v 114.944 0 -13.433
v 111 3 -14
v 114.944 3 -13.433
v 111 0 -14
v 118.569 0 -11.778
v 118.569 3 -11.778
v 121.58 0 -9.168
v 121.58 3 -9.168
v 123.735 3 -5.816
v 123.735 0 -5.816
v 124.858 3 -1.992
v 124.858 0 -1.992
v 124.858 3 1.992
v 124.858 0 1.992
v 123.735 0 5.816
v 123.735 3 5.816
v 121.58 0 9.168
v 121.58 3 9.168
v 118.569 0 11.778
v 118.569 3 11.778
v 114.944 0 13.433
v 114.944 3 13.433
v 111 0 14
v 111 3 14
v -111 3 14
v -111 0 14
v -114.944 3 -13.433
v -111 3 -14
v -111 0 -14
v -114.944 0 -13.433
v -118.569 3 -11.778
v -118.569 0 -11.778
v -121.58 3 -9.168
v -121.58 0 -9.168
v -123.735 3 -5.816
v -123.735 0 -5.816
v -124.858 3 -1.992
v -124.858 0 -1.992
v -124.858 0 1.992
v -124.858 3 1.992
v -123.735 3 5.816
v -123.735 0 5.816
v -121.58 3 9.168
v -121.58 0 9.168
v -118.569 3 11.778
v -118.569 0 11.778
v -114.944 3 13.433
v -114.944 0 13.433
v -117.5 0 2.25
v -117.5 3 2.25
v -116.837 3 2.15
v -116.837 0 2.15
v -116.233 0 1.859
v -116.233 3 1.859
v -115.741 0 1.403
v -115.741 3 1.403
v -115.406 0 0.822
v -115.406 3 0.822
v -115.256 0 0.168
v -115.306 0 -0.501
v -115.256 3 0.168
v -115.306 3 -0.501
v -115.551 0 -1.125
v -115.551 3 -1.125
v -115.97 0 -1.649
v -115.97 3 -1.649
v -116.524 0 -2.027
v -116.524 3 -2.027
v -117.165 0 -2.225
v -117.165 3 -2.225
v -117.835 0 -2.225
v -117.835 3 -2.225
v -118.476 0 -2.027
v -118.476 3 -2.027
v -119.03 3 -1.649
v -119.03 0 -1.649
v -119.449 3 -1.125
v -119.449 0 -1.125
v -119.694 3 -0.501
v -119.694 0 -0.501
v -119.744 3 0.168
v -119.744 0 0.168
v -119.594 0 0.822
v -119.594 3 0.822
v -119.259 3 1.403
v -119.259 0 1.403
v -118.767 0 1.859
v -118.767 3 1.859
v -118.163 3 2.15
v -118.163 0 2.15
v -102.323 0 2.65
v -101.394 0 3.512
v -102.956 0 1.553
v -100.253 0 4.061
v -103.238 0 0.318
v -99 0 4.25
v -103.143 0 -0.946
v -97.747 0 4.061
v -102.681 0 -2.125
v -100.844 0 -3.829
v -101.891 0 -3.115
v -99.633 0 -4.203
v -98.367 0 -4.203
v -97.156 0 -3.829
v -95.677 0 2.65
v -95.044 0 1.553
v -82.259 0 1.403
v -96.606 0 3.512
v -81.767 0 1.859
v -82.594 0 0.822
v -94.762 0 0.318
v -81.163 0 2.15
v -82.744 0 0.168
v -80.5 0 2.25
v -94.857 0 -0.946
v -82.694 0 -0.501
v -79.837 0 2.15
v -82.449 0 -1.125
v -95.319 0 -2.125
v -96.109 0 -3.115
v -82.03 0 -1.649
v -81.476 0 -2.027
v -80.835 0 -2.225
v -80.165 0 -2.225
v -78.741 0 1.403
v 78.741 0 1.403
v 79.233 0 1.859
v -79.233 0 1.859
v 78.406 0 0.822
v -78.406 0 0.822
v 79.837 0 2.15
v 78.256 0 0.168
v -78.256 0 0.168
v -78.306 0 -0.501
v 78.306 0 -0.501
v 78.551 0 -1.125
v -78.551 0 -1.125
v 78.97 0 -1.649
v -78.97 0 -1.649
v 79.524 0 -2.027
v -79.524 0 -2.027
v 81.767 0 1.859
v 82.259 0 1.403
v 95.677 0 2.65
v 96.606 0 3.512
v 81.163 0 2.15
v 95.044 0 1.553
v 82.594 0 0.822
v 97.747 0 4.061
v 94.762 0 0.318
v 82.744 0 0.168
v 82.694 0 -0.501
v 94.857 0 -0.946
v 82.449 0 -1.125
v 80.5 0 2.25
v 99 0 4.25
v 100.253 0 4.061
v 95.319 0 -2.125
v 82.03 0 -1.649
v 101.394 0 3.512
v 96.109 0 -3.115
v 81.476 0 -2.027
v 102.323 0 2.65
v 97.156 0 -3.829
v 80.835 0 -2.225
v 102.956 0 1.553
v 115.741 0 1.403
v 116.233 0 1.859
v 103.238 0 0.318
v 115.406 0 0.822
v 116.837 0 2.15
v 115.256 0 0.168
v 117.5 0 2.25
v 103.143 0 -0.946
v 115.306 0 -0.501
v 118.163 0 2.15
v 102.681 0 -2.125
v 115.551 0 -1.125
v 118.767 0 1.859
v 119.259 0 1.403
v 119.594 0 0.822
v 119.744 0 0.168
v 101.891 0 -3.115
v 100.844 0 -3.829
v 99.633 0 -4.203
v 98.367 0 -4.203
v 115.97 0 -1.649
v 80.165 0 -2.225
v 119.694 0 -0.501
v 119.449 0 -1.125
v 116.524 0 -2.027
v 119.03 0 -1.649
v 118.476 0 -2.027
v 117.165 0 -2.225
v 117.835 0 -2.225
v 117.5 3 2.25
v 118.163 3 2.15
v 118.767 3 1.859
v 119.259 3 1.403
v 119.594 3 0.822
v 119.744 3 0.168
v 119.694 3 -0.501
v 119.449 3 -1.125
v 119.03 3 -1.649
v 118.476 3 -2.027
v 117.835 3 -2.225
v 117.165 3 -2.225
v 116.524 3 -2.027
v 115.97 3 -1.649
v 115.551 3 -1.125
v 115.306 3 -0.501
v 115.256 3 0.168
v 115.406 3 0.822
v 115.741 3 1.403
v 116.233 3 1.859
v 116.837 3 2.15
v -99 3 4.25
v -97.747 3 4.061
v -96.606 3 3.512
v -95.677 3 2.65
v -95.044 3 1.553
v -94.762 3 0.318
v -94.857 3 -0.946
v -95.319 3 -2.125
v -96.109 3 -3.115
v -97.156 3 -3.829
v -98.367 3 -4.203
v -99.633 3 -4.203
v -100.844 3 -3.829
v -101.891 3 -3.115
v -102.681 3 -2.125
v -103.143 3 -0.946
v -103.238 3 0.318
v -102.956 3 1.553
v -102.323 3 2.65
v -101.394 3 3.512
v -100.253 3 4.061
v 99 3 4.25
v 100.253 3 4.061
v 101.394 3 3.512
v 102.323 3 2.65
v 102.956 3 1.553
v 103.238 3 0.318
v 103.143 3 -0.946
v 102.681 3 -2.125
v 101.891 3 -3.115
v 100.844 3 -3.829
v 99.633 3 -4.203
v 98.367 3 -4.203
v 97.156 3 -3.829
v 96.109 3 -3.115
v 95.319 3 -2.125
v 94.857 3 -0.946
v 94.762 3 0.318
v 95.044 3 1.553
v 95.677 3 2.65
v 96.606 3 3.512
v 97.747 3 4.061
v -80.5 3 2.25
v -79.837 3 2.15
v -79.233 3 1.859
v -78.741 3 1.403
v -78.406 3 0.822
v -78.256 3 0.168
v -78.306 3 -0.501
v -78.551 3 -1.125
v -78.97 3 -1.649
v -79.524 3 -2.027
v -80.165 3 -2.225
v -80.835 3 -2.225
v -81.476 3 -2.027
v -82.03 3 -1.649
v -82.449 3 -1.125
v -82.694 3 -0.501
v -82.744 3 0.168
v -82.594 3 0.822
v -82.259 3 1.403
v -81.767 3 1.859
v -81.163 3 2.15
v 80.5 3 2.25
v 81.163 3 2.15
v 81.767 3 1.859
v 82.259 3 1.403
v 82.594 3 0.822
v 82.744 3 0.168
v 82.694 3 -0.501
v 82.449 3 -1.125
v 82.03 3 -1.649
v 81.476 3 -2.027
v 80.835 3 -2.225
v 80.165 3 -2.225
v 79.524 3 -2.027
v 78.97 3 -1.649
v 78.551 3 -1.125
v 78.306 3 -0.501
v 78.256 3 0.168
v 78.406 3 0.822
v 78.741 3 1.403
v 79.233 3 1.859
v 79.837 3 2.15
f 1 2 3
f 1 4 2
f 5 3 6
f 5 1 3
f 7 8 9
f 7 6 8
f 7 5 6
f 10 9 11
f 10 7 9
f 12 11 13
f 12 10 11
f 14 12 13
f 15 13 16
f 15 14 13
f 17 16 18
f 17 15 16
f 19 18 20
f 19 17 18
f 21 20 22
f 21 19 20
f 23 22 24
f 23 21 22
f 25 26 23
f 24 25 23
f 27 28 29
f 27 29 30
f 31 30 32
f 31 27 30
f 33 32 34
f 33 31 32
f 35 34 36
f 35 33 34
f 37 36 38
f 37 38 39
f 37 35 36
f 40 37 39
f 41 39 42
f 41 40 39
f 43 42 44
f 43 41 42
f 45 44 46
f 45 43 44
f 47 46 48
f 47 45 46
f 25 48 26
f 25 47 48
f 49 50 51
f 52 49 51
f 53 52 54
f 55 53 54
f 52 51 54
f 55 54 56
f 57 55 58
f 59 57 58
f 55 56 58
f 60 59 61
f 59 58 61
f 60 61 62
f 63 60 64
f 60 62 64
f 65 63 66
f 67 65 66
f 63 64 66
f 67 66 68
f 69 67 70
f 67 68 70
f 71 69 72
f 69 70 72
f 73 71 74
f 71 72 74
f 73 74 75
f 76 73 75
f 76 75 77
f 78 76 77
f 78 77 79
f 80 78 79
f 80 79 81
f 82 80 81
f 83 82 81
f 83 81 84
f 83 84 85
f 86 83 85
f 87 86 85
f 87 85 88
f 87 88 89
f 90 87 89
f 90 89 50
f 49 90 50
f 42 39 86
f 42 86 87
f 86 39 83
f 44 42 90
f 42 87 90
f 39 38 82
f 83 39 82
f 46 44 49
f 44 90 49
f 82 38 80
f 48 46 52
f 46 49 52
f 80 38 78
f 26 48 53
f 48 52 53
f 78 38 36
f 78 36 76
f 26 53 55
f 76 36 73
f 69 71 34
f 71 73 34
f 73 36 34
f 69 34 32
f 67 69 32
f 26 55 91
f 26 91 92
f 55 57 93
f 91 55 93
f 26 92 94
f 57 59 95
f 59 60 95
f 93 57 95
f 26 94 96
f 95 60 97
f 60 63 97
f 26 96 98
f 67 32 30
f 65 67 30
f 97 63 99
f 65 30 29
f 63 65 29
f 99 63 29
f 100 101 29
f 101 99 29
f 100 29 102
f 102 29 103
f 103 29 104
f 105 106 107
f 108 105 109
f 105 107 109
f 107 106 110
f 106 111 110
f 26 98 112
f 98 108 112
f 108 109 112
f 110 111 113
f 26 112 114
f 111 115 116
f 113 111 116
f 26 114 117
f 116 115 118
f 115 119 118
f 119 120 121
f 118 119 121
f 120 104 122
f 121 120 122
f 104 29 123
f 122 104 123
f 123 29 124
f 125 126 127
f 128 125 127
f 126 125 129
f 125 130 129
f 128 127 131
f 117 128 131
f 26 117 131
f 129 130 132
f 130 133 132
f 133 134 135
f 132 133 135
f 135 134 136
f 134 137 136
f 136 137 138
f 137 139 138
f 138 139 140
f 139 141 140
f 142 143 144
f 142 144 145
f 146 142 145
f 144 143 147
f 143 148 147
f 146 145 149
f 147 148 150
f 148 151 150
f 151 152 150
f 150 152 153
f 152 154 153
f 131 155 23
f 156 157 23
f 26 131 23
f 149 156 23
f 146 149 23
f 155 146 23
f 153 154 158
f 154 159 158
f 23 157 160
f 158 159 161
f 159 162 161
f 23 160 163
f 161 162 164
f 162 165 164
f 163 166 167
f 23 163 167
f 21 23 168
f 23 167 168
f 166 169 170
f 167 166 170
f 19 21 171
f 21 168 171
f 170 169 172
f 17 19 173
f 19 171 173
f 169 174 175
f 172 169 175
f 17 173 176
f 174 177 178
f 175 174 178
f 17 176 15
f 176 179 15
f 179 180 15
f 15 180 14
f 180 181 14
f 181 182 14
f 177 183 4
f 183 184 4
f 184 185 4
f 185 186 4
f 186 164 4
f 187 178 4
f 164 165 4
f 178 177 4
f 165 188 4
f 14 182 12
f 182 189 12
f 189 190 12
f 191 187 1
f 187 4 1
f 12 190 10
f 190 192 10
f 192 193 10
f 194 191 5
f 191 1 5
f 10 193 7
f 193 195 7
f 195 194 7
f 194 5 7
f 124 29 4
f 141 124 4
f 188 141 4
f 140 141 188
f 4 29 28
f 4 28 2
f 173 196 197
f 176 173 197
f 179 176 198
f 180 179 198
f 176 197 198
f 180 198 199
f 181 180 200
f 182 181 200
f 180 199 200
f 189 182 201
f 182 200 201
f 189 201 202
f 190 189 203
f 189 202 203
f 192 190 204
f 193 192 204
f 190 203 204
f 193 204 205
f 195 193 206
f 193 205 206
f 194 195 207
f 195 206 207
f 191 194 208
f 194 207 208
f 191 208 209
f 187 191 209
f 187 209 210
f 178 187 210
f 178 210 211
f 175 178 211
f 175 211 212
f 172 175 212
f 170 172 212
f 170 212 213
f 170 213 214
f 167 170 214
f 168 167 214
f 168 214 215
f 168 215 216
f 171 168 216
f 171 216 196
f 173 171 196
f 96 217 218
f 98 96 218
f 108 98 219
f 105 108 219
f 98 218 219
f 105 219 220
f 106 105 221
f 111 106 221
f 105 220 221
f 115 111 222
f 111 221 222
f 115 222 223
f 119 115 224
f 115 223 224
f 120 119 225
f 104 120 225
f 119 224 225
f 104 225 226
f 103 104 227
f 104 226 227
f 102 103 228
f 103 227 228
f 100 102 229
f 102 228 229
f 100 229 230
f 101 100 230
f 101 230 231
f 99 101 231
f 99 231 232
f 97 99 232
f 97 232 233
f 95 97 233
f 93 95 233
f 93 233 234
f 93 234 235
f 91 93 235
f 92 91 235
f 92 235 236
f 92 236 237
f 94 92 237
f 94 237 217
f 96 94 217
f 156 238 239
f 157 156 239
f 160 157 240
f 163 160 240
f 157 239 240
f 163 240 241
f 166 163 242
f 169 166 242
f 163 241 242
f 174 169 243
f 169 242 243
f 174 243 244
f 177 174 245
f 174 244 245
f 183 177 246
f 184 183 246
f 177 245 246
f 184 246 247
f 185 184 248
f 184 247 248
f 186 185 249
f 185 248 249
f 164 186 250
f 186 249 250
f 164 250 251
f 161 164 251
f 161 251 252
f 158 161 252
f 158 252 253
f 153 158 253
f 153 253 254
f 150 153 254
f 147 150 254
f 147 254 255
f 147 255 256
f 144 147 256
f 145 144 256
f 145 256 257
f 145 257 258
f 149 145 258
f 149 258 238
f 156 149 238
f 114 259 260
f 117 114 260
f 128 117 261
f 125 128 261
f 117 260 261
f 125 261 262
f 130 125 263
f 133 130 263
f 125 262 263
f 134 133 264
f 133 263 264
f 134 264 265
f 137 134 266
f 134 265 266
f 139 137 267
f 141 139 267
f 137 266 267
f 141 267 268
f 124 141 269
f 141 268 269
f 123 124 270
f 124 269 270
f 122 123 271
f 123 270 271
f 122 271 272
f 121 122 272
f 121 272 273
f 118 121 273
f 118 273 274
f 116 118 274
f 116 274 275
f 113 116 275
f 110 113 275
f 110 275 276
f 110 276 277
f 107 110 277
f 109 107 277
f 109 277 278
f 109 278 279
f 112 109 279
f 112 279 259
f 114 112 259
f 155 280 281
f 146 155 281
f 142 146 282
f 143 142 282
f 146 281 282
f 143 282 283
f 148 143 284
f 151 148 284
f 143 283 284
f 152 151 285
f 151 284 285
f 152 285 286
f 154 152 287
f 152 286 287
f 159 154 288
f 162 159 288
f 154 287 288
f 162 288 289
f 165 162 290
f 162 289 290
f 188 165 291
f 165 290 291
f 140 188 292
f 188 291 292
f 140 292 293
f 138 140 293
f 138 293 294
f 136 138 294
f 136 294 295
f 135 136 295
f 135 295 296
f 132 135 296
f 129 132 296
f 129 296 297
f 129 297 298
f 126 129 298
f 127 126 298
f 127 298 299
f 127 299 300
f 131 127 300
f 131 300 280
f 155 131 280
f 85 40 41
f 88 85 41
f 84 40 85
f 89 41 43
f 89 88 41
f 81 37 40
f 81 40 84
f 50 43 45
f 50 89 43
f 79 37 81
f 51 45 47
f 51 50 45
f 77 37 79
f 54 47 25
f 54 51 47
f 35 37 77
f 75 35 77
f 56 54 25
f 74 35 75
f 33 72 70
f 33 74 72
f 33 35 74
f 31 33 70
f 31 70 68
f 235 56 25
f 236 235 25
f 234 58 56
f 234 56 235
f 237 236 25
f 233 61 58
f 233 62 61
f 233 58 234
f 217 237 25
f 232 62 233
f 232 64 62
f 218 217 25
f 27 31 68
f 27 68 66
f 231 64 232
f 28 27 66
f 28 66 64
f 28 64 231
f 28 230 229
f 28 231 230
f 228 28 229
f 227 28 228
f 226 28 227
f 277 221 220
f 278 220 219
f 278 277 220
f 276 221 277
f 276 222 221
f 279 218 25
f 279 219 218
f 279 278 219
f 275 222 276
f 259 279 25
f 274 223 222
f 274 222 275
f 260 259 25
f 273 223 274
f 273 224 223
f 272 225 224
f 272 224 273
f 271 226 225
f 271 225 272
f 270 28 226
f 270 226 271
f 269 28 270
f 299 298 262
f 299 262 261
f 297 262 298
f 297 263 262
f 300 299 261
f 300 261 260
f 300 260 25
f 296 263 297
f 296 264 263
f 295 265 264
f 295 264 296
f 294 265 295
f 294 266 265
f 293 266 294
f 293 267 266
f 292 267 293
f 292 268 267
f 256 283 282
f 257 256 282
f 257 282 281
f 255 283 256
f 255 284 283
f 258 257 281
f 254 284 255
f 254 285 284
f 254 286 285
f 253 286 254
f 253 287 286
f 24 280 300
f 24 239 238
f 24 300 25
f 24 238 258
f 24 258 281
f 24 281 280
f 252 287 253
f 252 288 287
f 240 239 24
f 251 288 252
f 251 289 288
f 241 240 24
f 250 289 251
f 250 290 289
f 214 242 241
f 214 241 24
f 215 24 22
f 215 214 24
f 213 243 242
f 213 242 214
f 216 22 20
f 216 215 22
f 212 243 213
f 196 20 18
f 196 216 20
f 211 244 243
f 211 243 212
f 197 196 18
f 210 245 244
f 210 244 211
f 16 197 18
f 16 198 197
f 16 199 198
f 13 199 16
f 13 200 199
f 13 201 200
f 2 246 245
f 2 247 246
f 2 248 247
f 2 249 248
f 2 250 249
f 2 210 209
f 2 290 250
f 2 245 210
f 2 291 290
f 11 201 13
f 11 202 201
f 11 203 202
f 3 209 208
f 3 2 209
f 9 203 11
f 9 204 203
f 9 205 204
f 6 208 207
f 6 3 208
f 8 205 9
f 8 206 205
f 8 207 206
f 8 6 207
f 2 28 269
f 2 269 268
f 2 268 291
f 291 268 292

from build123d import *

# Parameters (mm, degrees)
SKETCH_1_W          = 250
SKETCH_1_H          = 28
EXTRUDE_1_DEPTH     = 3
CUT_EXTRUDE_1_REACH = 127.817
SKETCH_2_R          = 4.25
CUT_EXTRUDE_2_REACH = 127.817
SKETCH_3_R          = 2.25
FILLET_1_RADIUS     = 14
FILLET_1_LENGTH     = 3
FILLET_2_RADIUS     = 14
FILLET_2_LENGTH     = 3


with BuildPart() as part:
    # 草图1 → 凸台-拉伸1 (new body)
    with BuildSketch(Plane(origin=(0, 0, 0), x_dir=(1, 0, 0), z_dir=(0, 1, 0))):
        Rectangle(SKETCH_1_W, SKETCH_1_H)
    extrude(amount=EXTRUDE_1_DEPTH)

    # 草图2 → 切除-拉伸1 (cut, up to next)
    with BuildSketch(Plane(origin=(0, 3, 0), x_dir=(1, 0, 0), z_dir=(0, 1, 0)), mode=Mode.PRIVATE) as cut_extrude_1_sk1:
        with Locations(Location((-99, 0, 0), (0, 0, 270))):
            Circle(SKETCH_2_R)
    cut_extrude_1_tool1 = extrude(cut_extrude_1_sk1.sketch, amount=-CUT_EXTRUDE_1_REACH, mode=Mode.PRIVATE) & part.part
    # 草图2 → 切除-拉伸1 (cut, up to next)
    with BuildSketch(Plane(origin=(0, 3, 0), x_dir=(1, 0, 0), z_dir=(0, 1, 0)), mode=Mode.PRIVATE) as cut_extrude_1_sk2:
        with Locations(Location((99, 0, 0), (0, 0, 270))):
            Circle(SKETCH_2_R)
    cut_extrude_1_tool2 = extrude(cut_extrude_1_sk2.sketch, amount=-CUT_EXTRUDE_1_REACH, mode=Mode.PRIVATE) & part.part
    add(cut_extrude_1_tool1.solids().sort_by_distance((-99, 3, 0))[0], mode=Mode.SUBTRACT)
    add(cut_extrude_1_tool2.solids().sort_by_distance((99, 3, 0))[0], mode=Mode.SUBTRACT)

    # 草图3 → 切除-拉伸2 (cut, up to next)
    with BuildSketch(Plane(origin=(0, 3, 0), x_dir=(1, 0, 0), z_dir=(0, 1, 0)), mode=Mode.PRIVATE) as cut_extrude_2_sk1:
        with Locations(Location((-117.5, 0, 0), (0, 0, 270))):
            Circle(SKETCH_3_R)
    cut_extrude_2_tool1 = extrude(cut_extrude_2_sk1.sketch, amount=-CUT_EXTRUDE_2_REACH, mode=Mode.PRIVATE) & part.part
    # 草图3 → 切除-拉伸2 (cut, up to next)
    with BuildSketch(Plane(origin=(0, 3, 0), x_dir=(1, 0, 0), z_dir=(0, 1, 0)), mode=Mode.PRIVATE) as cut_extrude_2_sk2:
        with Locations(Location((-80.5, 0, 0), (0, 0, 270))):
            Circle(SKETCH_3_R)
    cut_extrude_2_tool2 = extrude(cut_extrude_2_sk2.sketch, amount=-CUT_EXTRUDE_2_REACH, mode=Mode.PRIVATE) & part.part
    # 草图3 → 切除-拉伸2 (cut, up to next)
    with BuildSketch(Plane(origin=(0, 3, 0), x_dir=(1, 0, 0), z_dir=(0, 1, 0)), mode=Mode.PRIVATE) as cut_extrude_2_sk3:
        with Locations(Location((80.5, 0, 0), (0, 0, 270))):
            Circle(SKETCH_3_R)
    cut_extrude_2_tool3 = extrude(cut_extrude_2_sk3.sketch, amount=-CUT_EXTRUDE_2_REACH, mode=Mode.PRIVATE) & part.part
    # 草图3 → 切除-拉伸2 (cut, up to next)
    with BuildSketch(Plane(origin=(0, 3, 0), x_dir=(1, 0, 0), z_dir=(0, 1, 0)), mode=Mode.PRIVATE) as cut_extrude_2_sk4:
        with Locations(Location((117.5, 0, 0), (0, 0, 270))):
            Circle(SKETCH_3_R)
    cut_extrude_2_tool4 = extrude(cut_extrude_2_sk4.sketch, amount=-CUT_EXTRUDE_2_REACH, mode=Mode.PRIVATE) & part.part
    add(cut_extrude_2_tool1.solids().sort_by_distance((-117.5, 3, 0))[0], mode=Mode.SUBTRACT)
    add(cut_extrude_2_tool2.solids().sort_by_distance((-80.5, 3, 0))[0], mode=Mode.SUBTRACT)
    add(cut_extrude_2_tool3.solids().sort_by_distance((80.5, 3, 0))[0], mode=Mode.SUBTRACT)
    add(cut_extrude_2_tool4.solids().sort_by_distance((117.5, 3, 0))[0], mode=Mode.SUBTRACT)

    # 圆角1: full round fillet: the end face becomes a half cylinder, R = half its width
    fillet_1_face = Plane((-125, 1.5, 0), x_dir=(0, 1, 0), z_dir=(-1, 0, 0))  # on the end face: x along it, z out of the body
    fillet_1_slab = fillet_1_face.offset(-FILLET_1_RADIUS / 2) * Box(FILLET_1_LENGTH, 2 * FILLET_1_RADIUS, FILLET_1_RADIUS, mode=Mode.PRIVATE)  # the body's end, R deep
    fillet_1_round = Plane((-111, 1.5, 0), x_dir=(-1, 0, 0), z_dir=(0, 1, 0)) * Cylinder(FILLET_1_RADIUS, FILLET_1_LENGTH, mode=Mode.PRIVATE)  # its axis R under the face
    add(fillet_1_slab - fillet_1_round, mode=Mode.SUBTRACT)

    # 圆角2: full round fillet: the end face becomes a half cylinder, R = half its width
    fillet_2_face = Plane((125, 1.5, 0), x_dir=(0, -1, 0), z_dir=(1, 0, 0))  # on the end face: x along it, z out of the body
    fillet_2_slab = fillet_2_face.offset(-FILLET_2_RADIUS / 2) * Box(FILLET_2_LENGTH, 2 * FILLET_2_RADIUS, FILLET_2_RADIUS, mode=Mode.PRIVATE)  # the body's end, R deep
    fillet_2_round = Plane((111, 1.5, 0), x_dir=(1, 0, 0), z_dir=(0, -1, 0)) * Cylinder(FILLET_2_RADIUS, FILLET_2_LENGTH, mode=Mode.PRIVATE)  # its axis R under the face
    add(fillet_2_slab - fillet_2_round, mode=Mode.SUBTRACT)


solid = part.part
